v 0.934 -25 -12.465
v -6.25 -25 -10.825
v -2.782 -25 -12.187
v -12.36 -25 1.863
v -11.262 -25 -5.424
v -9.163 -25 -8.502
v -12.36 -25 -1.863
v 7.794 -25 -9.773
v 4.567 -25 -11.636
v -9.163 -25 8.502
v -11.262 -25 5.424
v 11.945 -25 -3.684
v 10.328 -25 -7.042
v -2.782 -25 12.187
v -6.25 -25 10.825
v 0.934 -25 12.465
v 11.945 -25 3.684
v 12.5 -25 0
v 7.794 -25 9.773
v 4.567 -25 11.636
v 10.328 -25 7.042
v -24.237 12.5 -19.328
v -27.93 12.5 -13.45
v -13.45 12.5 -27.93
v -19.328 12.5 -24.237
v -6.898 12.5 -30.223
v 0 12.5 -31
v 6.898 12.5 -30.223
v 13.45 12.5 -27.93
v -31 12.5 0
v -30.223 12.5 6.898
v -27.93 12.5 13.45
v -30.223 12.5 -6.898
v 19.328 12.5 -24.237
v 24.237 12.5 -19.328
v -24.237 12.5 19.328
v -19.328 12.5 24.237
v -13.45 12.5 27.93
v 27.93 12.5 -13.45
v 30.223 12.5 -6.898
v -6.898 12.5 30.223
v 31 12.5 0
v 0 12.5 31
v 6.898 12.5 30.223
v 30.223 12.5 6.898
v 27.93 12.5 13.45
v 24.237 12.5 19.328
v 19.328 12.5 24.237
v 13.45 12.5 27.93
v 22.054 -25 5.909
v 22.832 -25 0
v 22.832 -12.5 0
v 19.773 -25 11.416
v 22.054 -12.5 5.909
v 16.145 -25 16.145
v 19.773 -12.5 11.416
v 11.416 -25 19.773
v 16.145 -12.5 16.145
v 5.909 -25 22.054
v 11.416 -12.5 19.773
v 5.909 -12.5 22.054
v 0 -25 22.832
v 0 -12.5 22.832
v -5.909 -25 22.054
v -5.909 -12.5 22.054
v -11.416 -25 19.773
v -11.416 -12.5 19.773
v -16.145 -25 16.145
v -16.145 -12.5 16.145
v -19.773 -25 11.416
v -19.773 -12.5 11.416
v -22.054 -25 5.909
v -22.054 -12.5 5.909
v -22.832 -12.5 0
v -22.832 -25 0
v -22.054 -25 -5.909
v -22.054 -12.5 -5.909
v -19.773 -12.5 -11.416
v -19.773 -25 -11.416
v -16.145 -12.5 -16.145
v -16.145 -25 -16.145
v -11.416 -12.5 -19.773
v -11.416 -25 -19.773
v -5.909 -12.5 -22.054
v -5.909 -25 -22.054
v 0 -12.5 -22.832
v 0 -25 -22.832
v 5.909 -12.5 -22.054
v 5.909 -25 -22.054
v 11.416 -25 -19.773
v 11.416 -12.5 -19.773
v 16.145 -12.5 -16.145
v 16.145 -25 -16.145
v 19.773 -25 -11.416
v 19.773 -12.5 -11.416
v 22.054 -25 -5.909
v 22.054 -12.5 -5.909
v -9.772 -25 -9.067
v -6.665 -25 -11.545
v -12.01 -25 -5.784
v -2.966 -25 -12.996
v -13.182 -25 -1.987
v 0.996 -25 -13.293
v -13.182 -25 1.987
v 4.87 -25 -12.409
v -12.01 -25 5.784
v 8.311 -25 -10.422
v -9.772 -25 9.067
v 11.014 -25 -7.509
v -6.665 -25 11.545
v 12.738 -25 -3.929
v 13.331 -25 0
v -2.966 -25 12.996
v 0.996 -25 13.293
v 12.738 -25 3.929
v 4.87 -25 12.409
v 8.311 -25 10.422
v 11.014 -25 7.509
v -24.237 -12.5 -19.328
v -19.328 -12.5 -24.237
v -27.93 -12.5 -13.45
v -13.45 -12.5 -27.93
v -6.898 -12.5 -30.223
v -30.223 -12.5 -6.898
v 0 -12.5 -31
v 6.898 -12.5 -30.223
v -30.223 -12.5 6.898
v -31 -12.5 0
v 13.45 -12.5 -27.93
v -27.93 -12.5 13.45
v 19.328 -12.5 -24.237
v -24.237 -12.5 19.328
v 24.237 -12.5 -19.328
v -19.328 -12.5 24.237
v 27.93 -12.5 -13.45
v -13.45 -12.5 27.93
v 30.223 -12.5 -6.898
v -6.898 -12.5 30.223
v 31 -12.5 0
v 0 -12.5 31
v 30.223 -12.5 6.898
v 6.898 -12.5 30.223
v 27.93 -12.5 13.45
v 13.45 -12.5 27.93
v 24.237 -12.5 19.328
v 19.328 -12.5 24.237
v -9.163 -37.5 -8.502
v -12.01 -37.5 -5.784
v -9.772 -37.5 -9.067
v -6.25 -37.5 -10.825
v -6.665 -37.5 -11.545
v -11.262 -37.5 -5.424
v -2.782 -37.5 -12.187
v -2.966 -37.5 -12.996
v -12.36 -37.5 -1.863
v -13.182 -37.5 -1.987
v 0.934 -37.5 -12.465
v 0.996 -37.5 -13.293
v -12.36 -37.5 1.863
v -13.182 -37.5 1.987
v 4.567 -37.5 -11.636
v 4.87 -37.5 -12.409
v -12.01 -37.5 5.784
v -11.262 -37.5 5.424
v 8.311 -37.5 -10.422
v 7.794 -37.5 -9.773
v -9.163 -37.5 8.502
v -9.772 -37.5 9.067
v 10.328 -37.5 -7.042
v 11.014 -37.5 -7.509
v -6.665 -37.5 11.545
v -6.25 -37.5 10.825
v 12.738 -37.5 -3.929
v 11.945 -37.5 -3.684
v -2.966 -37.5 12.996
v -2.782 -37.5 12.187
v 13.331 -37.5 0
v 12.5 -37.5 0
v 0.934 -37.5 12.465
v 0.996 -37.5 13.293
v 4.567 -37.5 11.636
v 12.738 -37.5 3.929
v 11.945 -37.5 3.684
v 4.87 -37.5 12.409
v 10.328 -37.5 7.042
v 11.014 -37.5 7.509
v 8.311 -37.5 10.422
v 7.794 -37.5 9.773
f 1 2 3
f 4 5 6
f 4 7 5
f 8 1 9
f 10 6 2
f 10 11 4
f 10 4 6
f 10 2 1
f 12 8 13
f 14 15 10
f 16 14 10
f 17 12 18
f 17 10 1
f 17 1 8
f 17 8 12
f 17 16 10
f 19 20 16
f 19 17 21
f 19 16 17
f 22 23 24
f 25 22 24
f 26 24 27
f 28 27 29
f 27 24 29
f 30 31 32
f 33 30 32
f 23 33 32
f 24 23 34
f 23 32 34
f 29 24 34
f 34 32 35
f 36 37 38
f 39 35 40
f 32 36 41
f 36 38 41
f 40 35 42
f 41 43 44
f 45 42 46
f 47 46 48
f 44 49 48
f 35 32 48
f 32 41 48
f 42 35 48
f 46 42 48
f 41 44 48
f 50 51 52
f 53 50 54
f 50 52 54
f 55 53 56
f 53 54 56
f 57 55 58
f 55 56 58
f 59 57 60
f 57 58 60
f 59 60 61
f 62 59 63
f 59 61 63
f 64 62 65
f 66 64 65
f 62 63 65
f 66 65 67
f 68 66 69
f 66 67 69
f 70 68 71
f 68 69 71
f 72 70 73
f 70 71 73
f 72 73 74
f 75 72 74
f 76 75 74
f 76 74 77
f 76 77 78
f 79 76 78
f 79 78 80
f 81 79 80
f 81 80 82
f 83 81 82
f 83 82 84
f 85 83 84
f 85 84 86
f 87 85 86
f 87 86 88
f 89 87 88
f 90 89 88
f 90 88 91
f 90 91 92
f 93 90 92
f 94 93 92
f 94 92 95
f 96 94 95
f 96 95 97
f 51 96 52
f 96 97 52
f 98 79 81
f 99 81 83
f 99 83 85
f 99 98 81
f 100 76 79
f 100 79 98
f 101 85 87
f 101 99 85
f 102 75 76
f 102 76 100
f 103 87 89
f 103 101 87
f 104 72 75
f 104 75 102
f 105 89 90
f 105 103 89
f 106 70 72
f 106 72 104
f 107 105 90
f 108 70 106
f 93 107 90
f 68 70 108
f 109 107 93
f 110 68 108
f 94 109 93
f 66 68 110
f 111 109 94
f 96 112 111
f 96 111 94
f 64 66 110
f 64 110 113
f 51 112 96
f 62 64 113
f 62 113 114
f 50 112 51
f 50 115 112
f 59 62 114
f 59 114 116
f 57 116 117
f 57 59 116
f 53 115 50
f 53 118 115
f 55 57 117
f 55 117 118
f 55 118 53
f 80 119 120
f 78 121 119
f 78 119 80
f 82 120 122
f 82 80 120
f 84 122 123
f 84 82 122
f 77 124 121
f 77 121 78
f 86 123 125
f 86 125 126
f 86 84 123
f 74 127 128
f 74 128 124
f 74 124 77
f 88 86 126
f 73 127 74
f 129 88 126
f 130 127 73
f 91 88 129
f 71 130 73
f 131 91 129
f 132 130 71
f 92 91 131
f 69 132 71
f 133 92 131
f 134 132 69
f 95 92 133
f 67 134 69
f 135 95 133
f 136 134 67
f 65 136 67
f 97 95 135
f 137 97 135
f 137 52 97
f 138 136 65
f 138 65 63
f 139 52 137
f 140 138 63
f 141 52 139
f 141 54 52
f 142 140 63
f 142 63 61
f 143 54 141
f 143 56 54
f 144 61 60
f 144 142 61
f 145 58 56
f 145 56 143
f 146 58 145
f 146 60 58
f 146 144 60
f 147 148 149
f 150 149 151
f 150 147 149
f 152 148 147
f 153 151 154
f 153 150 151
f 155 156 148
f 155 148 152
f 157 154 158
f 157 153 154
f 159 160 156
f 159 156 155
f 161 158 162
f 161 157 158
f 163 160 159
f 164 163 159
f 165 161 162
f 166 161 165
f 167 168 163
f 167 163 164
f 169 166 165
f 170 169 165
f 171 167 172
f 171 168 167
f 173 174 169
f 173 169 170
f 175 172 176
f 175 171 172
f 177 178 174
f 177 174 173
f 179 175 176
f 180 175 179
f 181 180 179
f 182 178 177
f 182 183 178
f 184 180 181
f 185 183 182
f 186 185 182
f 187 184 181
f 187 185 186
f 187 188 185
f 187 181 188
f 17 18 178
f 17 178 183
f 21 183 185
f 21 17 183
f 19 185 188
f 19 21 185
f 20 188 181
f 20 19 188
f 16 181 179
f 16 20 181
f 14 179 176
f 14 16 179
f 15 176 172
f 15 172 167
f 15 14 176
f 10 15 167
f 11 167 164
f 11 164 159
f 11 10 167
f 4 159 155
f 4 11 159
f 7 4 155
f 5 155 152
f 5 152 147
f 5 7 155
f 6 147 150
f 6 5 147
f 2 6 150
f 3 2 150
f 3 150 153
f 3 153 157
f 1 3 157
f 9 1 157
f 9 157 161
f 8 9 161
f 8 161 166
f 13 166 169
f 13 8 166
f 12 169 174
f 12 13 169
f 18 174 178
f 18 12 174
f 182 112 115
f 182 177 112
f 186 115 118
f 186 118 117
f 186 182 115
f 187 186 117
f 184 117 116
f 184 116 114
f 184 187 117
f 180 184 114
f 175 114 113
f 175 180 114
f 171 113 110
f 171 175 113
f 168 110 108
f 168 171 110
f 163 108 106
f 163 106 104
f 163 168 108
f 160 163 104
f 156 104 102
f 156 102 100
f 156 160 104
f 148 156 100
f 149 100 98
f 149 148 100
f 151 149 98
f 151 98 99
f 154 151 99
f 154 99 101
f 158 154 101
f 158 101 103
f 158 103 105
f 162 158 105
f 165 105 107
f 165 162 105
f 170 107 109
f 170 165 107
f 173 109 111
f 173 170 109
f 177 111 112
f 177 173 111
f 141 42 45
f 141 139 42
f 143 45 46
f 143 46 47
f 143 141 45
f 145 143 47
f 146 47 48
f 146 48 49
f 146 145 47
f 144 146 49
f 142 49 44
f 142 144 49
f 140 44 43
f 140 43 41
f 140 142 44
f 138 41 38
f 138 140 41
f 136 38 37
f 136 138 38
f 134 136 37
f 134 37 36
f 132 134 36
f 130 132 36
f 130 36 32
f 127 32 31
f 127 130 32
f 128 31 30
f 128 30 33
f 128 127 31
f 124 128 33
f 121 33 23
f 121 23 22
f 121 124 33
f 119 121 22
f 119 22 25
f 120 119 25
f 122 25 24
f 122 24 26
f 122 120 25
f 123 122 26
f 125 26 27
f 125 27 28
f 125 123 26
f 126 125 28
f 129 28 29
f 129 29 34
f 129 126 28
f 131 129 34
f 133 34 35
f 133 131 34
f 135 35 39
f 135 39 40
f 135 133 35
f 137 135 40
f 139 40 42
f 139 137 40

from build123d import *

# Parameters (mm, degrees)
F0_R     = 31
F1_DEPTH = 12.5
F2_R     = 22.832123
F3_DEPTH = 25
F4_R     = 13.330594
F4_R_2   = 12.5
F5_DEPTH = 12.5


with BuildPart() as f1:
    # F0 (on Front) → F1 (new body, symmetric)
    with BuildSketch(Plane.XZ):
        Circle(F0_R)
    extrude(amount=F1_DEPTH, both=True)

    # F2 (on Front) → F3 (join)
    with BuildSketch(Plane.XZ):
        Circle(F2_R)
    extrude(amount=F3_DEPTH)

    # F4 (on face) → F5 (join, symmetric)
    with BuildSketch(Plane.XZ.offset(25)):
        Circle(F4_R)
        Circle(F4_R_2, mode=Mode.SUBTRACT)
    extrude(amount=F5_DEPTH, both=True)


solid = f1.part
